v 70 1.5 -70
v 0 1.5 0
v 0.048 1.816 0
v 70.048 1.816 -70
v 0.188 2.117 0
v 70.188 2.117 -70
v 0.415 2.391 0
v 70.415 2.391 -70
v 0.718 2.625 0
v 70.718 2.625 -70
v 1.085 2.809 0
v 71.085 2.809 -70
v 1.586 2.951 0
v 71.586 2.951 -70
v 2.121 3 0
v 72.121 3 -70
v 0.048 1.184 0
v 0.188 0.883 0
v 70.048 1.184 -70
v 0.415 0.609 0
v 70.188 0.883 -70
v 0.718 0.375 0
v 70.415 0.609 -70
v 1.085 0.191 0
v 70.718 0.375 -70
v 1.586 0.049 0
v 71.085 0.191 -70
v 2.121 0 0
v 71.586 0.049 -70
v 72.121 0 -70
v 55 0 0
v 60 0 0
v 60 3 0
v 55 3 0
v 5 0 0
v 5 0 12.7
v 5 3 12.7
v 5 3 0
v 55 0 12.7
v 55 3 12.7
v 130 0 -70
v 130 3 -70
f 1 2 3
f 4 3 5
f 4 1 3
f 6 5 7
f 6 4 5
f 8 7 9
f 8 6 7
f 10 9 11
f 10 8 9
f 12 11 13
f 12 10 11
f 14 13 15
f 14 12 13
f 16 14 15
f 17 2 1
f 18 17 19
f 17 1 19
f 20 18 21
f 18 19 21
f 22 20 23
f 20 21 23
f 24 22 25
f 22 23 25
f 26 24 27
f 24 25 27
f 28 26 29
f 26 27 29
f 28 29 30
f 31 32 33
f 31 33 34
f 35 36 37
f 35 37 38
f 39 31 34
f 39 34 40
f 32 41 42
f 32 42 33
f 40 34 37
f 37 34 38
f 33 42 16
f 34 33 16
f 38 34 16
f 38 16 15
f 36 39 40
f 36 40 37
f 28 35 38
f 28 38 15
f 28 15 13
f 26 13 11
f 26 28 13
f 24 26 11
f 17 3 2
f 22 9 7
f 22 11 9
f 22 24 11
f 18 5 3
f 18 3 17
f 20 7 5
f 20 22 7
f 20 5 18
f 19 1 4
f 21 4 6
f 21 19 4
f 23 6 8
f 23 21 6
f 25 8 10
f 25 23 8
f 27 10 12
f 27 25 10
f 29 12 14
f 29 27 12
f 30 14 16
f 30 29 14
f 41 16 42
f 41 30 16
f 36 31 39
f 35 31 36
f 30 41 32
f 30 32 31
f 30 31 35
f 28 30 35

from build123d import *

# Parameters (mm, degrees)
BOSS_EXTRUDE2_DEPTH = 3
FILLET1_R           = 1.5


with BuildPart() as part:
    # Sketch1 → Boss-Extrude2 (new body)
    with BuildSketch(Plane(origin=(0, 0, 0), x_dir=(1, 0, 0), z_dir=(0, 1, 0))):
        Polygon((0, 0), (70, 70), (130, 70), (60, 0), (55, 0), (55, -12.7), (5, -12.7), (5, 0), align=None)
    extrude(amount=BOSS_EXTRUDE2_DEPTH)

    # Fillet1
    fillet1_edges = [part.edges().sort_by_distance(p)[0] for p in [
        (35, 3, -35),
        (35, 0, -35),
    ]]
    fillet(fillet1_edges, radius=FILLET1_R - 0.0001)  # a hair under: the kernel refuses the full size


solid = part.part
